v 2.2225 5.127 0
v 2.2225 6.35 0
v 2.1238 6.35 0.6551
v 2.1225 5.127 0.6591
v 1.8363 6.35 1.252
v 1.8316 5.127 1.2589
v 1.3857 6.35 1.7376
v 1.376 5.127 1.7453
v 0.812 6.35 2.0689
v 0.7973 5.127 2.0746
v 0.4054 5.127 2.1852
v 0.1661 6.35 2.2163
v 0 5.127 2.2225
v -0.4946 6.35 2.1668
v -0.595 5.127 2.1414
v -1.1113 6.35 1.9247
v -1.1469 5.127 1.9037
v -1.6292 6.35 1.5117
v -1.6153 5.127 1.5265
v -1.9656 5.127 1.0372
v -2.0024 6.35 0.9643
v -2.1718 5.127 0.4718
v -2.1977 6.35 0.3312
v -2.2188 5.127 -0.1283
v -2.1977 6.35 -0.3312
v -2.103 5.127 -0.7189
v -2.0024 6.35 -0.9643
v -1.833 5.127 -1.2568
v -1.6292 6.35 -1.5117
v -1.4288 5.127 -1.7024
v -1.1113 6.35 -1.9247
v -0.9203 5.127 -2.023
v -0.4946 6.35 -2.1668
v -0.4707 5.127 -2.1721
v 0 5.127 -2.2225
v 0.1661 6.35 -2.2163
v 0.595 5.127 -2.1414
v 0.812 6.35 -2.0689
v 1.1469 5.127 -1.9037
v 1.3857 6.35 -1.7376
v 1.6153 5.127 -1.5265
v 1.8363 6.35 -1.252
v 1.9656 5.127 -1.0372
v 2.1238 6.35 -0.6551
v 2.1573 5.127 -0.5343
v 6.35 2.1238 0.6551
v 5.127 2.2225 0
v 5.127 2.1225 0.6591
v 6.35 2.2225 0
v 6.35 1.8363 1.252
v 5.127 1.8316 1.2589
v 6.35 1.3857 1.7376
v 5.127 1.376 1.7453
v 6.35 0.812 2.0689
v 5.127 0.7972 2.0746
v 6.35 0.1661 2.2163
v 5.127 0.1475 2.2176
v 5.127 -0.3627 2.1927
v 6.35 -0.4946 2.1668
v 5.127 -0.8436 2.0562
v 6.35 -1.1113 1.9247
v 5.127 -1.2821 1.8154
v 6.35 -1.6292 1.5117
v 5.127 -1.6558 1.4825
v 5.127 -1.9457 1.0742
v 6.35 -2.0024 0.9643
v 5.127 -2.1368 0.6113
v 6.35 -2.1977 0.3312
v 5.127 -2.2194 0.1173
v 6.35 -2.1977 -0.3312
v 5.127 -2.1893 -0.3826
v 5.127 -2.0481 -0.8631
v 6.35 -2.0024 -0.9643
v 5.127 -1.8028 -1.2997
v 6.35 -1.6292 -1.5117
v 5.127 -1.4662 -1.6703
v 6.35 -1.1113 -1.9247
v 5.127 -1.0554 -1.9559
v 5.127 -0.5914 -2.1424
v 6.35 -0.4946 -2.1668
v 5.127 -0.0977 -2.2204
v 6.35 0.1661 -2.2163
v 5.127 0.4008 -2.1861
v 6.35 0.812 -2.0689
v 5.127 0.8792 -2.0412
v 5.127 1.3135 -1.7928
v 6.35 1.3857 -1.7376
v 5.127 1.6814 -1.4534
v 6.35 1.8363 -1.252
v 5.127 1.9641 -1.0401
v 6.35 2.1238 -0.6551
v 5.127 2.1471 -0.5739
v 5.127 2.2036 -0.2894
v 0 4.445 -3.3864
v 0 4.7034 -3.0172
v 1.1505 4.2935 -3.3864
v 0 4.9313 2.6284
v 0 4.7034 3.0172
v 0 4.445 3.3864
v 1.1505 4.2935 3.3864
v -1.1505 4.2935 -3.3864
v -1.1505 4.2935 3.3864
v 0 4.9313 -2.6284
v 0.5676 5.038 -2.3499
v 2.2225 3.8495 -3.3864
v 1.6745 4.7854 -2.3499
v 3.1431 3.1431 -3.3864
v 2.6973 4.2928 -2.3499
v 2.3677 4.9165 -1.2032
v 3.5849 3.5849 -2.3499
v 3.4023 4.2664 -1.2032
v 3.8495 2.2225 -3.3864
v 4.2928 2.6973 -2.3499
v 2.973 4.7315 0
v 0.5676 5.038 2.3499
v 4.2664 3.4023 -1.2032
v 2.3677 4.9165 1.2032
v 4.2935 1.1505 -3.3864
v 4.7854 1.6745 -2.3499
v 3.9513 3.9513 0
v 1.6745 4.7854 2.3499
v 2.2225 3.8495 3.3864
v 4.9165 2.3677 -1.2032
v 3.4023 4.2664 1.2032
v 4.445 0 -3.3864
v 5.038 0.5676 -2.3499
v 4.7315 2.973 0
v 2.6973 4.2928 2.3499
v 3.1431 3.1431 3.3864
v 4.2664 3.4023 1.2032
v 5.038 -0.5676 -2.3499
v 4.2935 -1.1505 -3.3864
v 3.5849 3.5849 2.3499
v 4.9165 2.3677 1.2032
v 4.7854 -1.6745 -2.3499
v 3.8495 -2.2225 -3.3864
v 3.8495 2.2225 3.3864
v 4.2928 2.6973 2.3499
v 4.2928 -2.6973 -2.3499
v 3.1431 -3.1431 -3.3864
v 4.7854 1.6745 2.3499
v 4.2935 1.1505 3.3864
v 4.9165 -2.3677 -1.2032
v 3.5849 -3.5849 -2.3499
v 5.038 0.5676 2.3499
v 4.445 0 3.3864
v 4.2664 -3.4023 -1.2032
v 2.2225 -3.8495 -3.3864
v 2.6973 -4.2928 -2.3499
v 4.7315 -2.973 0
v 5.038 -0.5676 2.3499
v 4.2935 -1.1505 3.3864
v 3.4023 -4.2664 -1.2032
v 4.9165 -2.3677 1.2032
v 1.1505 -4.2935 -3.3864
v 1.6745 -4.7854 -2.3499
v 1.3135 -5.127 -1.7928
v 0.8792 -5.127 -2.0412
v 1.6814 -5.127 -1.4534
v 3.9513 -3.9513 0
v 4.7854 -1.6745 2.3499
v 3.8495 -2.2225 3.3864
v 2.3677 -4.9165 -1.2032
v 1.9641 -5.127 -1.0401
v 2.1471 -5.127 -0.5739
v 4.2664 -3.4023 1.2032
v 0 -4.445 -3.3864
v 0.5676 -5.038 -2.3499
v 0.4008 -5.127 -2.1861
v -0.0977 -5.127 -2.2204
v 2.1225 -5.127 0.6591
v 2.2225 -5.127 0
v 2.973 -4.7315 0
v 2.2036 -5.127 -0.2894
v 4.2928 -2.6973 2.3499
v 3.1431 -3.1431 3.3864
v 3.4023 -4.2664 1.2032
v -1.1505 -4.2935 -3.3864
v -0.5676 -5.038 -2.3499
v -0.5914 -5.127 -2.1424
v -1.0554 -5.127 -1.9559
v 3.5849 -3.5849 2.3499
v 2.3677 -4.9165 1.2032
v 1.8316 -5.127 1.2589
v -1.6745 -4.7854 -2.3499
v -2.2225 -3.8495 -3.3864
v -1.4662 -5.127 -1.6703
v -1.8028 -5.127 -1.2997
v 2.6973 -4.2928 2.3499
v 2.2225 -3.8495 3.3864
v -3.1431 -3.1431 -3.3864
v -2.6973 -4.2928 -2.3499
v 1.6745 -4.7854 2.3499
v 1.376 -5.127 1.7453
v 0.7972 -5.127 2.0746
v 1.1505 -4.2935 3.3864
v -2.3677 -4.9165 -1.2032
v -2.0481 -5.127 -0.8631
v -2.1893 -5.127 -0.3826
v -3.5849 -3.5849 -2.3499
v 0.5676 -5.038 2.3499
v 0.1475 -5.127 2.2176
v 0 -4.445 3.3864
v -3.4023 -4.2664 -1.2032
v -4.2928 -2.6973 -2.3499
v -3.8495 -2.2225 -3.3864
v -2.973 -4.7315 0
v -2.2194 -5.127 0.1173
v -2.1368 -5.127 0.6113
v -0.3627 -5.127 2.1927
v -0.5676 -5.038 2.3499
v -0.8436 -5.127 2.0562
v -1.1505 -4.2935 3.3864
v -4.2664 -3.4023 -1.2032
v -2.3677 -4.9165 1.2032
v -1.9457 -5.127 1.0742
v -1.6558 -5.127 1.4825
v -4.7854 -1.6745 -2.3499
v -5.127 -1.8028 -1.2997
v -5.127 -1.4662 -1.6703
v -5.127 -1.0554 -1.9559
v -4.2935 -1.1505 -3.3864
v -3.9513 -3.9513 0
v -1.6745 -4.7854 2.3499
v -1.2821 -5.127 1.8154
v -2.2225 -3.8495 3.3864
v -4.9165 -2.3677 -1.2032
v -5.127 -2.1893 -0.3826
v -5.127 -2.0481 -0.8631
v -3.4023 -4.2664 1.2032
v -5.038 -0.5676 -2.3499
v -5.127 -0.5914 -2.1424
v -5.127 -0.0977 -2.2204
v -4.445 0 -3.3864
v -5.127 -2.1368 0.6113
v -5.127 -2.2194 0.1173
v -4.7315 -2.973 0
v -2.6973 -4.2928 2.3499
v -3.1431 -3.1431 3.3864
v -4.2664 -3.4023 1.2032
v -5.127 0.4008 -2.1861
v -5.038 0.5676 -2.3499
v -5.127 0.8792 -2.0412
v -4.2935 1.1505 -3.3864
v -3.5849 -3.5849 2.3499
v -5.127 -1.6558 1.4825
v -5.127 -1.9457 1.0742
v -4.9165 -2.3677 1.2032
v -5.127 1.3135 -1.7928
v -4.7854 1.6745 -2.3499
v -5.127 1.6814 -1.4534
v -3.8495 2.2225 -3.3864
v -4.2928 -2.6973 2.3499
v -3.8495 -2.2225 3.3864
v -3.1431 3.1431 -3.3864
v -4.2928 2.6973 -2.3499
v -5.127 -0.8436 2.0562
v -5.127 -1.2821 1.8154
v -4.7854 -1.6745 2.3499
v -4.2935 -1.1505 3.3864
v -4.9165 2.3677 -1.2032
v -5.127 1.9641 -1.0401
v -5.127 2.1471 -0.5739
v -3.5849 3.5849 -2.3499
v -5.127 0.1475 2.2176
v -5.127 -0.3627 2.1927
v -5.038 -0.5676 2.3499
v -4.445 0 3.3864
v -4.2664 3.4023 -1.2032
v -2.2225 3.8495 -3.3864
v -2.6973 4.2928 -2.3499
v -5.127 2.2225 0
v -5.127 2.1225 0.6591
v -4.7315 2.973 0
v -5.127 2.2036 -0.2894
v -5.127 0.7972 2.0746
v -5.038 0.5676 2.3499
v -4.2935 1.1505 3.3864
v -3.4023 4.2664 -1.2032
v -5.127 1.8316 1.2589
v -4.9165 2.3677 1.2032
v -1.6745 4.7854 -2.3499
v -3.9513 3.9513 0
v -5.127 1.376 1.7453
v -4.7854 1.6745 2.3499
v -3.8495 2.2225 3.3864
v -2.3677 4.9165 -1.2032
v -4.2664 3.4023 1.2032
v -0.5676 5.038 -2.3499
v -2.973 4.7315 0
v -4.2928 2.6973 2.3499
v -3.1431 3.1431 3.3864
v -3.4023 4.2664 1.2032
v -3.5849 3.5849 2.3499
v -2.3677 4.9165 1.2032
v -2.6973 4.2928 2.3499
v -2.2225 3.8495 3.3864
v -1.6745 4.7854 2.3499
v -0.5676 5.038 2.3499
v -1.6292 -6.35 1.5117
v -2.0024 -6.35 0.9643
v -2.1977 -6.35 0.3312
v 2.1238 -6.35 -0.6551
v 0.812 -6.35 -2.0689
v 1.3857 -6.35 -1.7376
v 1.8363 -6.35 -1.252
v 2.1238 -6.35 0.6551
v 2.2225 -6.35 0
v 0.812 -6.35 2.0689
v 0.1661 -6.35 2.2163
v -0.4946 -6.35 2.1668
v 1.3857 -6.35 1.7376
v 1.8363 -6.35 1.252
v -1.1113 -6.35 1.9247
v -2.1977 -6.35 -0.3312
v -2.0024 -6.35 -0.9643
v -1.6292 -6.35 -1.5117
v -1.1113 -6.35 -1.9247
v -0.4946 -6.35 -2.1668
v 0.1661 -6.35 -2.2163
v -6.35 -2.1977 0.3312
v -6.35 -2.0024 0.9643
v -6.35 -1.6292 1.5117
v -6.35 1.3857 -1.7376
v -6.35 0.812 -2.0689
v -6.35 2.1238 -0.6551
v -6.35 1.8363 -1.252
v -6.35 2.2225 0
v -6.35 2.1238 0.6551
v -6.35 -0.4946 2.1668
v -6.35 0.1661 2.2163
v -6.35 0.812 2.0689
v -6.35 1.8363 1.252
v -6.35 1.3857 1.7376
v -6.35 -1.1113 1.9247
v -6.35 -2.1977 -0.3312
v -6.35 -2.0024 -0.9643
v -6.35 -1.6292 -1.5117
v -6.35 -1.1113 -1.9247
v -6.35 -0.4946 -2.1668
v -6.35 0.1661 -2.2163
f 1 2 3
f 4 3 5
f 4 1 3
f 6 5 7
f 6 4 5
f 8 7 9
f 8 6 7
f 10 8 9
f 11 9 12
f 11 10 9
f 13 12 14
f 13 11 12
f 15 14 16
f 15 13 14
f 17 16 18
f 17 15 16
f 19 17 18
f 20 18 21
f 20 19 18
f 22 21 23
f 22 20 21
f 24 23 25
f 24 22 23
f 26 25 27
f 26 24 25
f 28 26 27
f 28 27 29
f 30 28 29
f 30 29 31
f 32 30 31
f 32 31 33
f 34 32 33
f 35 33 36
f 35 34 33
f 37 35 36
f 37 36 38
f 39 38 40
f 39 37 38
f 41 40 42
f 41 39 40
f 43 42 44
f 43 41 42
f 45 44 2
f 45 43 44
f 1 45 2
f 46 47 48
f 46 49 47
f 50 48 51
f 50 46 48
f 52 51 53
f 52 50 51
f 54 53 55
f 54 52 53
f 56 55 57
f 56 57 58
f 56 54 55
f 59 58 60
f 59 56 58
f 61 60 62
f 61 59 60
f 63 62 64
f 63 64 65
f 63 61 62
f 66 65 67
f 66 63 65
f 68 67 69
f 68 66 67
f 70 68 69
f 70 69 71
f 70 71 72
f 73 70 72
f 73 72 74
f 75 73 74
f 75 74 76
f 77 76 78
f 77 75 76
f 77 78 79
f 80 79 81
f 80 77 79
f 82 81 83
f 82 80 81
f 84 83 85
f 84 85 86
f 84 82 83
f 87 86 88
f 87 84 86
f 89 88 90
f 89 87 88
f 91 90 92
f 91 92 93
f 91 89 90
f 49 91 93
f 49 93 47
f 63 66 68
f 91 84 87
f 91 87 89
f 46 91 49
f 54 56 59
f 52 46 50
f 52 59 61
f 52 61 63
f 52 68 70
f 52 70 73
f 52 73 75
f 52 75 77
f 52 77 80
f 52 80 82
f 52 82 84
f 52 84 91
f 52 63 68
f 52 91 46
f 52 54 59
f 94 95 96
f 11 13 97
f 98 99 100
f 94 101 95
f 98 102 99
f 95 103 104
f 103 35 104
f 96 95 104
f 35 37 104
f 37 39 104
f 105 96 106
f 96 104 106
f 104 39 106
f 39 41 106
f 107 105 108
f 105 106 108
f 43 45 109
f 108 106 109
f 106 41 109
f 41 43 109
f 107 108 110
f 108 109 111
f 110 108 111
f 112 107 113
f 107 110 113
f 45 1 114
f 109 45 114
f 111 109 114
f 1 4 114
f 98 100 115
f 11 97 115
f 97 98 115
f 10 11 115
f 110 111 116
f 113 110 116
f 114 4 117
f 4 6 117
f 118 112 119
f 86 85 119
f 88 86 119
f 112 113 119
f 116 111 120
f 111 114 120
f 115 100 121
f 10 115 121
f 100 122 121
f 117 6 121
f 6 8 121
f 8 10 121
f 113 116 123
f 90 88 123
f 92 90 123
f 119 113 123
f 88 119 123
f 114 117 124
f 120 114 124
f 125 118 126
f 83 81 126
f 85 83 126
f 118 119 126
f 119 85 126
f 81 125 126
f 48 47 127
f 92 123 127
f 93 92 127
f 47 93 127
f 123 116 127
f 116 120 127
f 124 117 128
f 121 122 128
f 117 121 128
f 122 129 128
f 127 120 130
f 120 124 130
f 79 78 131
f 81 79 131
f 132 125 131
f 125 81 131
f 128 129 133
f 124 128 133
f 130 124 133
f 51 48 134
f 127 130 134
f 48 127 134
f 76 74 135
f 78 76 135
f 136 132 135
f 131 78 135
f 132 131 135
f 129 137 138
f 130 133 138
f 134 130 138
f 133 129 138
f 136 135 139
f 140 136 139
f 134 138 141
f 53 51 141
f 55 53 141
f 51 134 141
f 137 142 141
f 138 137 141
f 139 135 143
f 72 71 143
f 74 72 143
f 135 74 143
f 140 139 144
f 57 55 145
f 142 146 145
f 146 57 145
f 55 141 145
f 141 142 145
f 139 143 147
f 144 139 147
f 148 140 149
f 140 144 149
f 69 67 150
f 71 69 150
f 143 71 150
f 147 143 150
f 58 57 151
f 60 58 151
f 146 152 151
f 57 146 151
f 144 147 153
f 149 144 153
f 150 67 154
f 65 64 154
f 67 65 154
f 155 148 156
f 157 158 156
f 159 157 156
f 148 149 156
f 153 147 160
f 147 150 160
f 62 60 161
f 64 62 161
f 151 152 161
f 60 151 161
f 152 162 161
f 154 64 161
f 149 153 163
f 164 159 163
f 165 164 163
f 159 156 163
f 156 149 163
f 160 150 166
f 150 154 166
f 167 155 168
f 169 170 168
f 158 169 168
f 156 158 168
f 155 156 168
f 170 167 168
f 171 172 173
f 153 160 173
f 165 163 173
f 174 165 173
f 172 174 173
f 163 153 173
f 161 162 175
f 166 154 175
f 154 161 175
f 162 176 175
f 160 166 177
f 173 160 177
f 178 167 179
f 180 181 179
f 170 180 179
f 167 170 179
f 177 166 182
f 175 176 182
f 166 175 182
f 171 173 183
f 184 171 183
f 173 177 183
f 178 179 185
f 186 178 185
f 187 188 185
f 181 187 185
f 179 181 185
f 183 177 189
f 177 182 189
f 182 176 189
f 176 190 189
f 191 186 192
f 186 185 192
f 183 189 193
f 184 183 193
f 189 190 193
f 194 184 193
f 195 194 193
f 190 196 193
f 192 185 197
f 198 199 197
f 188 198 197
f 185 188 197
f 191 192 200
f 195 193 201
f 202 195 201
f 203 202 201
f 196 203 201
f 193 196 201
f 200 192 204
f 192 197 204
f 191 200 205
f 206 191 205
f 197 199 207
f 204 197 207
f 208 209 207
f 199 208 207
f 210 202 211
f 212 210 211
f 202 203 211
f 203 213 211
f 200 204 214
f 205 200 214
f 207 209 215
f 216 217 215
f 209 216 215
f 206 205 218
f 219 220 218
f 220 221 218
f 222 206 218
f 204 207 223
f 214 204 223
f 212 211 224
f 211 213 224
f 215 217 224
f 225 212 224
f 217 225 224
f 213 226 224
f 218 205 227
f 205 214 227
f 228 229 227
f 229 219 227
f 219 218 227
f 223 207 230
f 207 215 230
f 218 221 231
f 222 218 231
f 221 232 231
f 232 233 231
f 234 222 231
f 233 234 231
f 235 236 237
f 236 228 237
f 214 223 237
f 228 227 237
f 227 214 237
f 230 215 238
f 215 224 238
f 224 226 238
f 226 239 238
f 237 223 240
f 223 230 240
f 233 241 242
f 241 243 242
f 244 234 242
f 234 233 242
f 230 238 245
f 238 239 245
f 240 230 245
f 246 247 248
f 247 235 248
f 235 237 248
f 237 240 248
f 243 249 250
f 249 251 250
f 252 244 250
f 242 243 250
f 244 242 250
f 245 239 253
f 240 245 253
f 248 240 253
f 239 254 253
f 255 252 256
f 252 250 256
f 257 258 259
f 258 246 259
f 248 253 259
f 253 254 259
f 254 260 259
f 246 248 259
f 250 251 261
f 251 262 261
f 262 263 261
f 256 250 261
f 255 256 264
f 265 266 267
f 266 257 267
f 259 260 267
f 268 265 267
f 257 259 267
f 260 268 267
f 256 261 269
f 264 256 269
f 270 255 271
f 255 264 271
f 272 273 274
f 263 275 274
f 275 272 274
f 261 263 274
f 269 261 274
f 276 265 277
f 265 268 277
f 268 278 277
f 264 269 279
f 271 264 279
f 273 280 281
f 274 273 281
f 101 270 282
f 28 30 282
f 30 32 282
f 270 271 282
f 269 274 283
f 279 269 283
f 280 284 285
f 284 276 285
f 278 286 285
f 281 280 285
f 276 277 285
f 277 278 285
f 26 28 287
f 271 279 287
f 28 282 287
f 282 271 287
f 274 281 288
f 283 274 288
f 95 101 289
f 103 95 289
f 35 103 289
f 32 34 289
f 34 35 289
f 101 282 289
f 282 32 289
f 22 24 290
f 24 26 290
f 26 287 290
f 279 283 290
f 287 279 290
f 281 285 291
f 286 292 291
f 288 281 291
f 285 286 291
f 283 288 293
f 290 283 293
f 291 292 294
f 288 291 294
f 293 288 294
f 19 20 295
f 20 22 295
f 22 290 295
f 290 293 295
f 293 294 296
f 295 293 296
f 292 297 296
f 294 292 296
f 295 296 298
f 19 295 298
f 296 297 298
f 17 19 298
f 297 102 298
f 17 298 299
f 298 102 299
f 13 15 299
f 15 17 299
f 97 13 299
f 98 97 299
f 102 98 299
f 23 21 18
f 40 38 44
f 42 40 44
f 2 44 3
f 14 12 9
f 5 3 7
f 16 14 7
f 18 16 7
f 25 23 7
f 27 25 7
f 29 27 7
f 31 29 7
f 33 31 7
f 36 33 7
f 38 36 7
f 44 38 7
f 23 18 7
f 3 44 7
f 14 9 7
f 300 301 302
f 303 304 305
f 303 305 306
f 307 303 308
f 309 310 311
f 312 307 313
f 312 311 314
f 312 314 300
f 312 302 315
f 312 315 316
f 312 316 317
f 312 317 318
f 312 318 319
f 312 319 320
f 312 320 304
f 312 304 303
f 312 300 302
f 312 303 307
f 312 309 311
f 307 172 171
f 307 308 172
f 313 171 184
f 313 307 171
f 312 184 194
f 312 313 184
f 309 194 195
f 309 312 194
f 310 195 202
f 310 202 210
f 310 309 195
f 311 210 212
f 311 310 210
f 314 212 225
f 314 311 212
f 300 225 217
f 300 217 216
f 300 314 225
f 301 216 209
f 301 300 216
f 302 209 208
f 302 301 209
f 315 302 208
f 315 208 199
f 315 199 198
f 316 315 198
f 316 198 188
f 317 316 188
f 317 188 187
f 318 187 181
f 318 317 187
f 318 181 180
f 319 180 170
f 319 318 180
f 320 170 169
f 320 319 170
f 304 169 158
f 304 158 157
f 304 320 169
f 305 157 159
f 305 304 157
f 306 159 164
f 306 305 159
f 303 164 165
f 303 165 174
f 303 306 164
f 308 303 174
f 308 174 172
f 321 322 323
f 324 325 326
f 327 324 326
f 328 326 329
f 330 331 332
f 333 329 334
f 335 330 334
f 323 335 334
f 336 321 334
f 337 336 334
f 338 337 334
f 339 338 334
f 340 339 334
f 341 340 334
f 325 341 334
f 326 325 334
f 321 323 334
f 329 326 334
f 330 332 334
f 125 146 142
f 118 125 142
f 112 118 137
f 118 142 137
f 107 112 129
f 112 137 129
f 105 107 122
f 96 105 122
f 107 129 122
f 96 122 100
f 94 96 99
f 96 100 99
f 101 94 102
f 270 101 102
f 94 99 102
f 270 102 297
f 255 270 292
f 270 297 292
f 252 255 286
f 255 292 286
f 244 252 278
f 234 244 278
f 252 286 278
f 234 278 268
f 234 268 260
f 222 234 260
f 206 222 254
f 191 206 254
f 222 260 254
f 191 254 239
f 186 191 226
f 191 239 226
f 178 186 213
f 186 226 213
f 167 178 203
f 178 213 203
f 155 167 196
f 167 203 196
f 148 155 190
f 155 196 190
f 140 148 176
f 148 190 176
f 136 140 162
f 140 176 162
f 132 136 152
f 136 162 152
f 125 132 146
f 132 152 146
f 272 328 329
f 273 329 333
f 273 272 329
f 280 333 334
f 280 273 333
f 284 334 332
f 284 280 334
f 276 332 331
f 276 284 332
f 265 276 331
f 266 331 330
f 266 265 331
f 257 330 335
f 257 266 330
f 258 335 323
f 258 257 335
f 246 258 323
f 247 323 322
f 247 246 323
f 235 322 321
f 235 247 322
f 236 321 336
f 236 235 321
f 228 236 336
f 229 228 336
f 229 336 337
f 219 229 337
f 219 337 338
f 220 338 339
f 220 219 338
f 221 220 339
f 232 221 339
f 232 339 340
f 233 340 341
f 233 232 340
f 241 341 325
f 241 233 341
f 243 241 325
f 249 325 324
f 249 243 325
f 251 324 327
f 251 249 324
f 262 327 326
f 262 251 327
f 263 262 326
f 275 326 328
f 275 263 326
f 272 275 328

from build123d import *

# Parameters (mm, degrees)
F0_R     = 2.2225
F3_DEPTH = 6.35
F1_R     = 2.2225
F4_DEPTH = 6.35
F6_R     = 4.445
F7_DEPTH = 12.7


with BuildPart() as f3:
    # F0 (on Right) → F3 (new body, symmetric)
    with BuildSketch(Plane.YZ):
        Circle(F0_R)
    extrude(amount=F3_DEPTH, both=True)

    # F1 (on Front) → F4 (join, symmetric)
    with BuildSketch(Plane.XZ):
        Circle(F1_R)
    extrude(amount=F4_DEPTH, both=True)

    # F2 (on Right) → F5 (revolve)
    with BuildSketch(Plane.YZ):
        with BuildLine():
            Line((0, 5.588), (0, -5.588))
            ThreePointArc((0, -5.588), (5.588, 0), (0, 5.588))
        make_face()
    revolve(axis=Axis((0, 0, -0.972137), (0, 0, -1)))

    # F6 (on Top) → F7 (cut, symmetric)
    with BuildSketch(Plane.XY):
        Circle(F6_R)
    extrude(amount=F7_DEPTH, both=True, mode=Mode.SUBTRACT)


solid = f3.part
